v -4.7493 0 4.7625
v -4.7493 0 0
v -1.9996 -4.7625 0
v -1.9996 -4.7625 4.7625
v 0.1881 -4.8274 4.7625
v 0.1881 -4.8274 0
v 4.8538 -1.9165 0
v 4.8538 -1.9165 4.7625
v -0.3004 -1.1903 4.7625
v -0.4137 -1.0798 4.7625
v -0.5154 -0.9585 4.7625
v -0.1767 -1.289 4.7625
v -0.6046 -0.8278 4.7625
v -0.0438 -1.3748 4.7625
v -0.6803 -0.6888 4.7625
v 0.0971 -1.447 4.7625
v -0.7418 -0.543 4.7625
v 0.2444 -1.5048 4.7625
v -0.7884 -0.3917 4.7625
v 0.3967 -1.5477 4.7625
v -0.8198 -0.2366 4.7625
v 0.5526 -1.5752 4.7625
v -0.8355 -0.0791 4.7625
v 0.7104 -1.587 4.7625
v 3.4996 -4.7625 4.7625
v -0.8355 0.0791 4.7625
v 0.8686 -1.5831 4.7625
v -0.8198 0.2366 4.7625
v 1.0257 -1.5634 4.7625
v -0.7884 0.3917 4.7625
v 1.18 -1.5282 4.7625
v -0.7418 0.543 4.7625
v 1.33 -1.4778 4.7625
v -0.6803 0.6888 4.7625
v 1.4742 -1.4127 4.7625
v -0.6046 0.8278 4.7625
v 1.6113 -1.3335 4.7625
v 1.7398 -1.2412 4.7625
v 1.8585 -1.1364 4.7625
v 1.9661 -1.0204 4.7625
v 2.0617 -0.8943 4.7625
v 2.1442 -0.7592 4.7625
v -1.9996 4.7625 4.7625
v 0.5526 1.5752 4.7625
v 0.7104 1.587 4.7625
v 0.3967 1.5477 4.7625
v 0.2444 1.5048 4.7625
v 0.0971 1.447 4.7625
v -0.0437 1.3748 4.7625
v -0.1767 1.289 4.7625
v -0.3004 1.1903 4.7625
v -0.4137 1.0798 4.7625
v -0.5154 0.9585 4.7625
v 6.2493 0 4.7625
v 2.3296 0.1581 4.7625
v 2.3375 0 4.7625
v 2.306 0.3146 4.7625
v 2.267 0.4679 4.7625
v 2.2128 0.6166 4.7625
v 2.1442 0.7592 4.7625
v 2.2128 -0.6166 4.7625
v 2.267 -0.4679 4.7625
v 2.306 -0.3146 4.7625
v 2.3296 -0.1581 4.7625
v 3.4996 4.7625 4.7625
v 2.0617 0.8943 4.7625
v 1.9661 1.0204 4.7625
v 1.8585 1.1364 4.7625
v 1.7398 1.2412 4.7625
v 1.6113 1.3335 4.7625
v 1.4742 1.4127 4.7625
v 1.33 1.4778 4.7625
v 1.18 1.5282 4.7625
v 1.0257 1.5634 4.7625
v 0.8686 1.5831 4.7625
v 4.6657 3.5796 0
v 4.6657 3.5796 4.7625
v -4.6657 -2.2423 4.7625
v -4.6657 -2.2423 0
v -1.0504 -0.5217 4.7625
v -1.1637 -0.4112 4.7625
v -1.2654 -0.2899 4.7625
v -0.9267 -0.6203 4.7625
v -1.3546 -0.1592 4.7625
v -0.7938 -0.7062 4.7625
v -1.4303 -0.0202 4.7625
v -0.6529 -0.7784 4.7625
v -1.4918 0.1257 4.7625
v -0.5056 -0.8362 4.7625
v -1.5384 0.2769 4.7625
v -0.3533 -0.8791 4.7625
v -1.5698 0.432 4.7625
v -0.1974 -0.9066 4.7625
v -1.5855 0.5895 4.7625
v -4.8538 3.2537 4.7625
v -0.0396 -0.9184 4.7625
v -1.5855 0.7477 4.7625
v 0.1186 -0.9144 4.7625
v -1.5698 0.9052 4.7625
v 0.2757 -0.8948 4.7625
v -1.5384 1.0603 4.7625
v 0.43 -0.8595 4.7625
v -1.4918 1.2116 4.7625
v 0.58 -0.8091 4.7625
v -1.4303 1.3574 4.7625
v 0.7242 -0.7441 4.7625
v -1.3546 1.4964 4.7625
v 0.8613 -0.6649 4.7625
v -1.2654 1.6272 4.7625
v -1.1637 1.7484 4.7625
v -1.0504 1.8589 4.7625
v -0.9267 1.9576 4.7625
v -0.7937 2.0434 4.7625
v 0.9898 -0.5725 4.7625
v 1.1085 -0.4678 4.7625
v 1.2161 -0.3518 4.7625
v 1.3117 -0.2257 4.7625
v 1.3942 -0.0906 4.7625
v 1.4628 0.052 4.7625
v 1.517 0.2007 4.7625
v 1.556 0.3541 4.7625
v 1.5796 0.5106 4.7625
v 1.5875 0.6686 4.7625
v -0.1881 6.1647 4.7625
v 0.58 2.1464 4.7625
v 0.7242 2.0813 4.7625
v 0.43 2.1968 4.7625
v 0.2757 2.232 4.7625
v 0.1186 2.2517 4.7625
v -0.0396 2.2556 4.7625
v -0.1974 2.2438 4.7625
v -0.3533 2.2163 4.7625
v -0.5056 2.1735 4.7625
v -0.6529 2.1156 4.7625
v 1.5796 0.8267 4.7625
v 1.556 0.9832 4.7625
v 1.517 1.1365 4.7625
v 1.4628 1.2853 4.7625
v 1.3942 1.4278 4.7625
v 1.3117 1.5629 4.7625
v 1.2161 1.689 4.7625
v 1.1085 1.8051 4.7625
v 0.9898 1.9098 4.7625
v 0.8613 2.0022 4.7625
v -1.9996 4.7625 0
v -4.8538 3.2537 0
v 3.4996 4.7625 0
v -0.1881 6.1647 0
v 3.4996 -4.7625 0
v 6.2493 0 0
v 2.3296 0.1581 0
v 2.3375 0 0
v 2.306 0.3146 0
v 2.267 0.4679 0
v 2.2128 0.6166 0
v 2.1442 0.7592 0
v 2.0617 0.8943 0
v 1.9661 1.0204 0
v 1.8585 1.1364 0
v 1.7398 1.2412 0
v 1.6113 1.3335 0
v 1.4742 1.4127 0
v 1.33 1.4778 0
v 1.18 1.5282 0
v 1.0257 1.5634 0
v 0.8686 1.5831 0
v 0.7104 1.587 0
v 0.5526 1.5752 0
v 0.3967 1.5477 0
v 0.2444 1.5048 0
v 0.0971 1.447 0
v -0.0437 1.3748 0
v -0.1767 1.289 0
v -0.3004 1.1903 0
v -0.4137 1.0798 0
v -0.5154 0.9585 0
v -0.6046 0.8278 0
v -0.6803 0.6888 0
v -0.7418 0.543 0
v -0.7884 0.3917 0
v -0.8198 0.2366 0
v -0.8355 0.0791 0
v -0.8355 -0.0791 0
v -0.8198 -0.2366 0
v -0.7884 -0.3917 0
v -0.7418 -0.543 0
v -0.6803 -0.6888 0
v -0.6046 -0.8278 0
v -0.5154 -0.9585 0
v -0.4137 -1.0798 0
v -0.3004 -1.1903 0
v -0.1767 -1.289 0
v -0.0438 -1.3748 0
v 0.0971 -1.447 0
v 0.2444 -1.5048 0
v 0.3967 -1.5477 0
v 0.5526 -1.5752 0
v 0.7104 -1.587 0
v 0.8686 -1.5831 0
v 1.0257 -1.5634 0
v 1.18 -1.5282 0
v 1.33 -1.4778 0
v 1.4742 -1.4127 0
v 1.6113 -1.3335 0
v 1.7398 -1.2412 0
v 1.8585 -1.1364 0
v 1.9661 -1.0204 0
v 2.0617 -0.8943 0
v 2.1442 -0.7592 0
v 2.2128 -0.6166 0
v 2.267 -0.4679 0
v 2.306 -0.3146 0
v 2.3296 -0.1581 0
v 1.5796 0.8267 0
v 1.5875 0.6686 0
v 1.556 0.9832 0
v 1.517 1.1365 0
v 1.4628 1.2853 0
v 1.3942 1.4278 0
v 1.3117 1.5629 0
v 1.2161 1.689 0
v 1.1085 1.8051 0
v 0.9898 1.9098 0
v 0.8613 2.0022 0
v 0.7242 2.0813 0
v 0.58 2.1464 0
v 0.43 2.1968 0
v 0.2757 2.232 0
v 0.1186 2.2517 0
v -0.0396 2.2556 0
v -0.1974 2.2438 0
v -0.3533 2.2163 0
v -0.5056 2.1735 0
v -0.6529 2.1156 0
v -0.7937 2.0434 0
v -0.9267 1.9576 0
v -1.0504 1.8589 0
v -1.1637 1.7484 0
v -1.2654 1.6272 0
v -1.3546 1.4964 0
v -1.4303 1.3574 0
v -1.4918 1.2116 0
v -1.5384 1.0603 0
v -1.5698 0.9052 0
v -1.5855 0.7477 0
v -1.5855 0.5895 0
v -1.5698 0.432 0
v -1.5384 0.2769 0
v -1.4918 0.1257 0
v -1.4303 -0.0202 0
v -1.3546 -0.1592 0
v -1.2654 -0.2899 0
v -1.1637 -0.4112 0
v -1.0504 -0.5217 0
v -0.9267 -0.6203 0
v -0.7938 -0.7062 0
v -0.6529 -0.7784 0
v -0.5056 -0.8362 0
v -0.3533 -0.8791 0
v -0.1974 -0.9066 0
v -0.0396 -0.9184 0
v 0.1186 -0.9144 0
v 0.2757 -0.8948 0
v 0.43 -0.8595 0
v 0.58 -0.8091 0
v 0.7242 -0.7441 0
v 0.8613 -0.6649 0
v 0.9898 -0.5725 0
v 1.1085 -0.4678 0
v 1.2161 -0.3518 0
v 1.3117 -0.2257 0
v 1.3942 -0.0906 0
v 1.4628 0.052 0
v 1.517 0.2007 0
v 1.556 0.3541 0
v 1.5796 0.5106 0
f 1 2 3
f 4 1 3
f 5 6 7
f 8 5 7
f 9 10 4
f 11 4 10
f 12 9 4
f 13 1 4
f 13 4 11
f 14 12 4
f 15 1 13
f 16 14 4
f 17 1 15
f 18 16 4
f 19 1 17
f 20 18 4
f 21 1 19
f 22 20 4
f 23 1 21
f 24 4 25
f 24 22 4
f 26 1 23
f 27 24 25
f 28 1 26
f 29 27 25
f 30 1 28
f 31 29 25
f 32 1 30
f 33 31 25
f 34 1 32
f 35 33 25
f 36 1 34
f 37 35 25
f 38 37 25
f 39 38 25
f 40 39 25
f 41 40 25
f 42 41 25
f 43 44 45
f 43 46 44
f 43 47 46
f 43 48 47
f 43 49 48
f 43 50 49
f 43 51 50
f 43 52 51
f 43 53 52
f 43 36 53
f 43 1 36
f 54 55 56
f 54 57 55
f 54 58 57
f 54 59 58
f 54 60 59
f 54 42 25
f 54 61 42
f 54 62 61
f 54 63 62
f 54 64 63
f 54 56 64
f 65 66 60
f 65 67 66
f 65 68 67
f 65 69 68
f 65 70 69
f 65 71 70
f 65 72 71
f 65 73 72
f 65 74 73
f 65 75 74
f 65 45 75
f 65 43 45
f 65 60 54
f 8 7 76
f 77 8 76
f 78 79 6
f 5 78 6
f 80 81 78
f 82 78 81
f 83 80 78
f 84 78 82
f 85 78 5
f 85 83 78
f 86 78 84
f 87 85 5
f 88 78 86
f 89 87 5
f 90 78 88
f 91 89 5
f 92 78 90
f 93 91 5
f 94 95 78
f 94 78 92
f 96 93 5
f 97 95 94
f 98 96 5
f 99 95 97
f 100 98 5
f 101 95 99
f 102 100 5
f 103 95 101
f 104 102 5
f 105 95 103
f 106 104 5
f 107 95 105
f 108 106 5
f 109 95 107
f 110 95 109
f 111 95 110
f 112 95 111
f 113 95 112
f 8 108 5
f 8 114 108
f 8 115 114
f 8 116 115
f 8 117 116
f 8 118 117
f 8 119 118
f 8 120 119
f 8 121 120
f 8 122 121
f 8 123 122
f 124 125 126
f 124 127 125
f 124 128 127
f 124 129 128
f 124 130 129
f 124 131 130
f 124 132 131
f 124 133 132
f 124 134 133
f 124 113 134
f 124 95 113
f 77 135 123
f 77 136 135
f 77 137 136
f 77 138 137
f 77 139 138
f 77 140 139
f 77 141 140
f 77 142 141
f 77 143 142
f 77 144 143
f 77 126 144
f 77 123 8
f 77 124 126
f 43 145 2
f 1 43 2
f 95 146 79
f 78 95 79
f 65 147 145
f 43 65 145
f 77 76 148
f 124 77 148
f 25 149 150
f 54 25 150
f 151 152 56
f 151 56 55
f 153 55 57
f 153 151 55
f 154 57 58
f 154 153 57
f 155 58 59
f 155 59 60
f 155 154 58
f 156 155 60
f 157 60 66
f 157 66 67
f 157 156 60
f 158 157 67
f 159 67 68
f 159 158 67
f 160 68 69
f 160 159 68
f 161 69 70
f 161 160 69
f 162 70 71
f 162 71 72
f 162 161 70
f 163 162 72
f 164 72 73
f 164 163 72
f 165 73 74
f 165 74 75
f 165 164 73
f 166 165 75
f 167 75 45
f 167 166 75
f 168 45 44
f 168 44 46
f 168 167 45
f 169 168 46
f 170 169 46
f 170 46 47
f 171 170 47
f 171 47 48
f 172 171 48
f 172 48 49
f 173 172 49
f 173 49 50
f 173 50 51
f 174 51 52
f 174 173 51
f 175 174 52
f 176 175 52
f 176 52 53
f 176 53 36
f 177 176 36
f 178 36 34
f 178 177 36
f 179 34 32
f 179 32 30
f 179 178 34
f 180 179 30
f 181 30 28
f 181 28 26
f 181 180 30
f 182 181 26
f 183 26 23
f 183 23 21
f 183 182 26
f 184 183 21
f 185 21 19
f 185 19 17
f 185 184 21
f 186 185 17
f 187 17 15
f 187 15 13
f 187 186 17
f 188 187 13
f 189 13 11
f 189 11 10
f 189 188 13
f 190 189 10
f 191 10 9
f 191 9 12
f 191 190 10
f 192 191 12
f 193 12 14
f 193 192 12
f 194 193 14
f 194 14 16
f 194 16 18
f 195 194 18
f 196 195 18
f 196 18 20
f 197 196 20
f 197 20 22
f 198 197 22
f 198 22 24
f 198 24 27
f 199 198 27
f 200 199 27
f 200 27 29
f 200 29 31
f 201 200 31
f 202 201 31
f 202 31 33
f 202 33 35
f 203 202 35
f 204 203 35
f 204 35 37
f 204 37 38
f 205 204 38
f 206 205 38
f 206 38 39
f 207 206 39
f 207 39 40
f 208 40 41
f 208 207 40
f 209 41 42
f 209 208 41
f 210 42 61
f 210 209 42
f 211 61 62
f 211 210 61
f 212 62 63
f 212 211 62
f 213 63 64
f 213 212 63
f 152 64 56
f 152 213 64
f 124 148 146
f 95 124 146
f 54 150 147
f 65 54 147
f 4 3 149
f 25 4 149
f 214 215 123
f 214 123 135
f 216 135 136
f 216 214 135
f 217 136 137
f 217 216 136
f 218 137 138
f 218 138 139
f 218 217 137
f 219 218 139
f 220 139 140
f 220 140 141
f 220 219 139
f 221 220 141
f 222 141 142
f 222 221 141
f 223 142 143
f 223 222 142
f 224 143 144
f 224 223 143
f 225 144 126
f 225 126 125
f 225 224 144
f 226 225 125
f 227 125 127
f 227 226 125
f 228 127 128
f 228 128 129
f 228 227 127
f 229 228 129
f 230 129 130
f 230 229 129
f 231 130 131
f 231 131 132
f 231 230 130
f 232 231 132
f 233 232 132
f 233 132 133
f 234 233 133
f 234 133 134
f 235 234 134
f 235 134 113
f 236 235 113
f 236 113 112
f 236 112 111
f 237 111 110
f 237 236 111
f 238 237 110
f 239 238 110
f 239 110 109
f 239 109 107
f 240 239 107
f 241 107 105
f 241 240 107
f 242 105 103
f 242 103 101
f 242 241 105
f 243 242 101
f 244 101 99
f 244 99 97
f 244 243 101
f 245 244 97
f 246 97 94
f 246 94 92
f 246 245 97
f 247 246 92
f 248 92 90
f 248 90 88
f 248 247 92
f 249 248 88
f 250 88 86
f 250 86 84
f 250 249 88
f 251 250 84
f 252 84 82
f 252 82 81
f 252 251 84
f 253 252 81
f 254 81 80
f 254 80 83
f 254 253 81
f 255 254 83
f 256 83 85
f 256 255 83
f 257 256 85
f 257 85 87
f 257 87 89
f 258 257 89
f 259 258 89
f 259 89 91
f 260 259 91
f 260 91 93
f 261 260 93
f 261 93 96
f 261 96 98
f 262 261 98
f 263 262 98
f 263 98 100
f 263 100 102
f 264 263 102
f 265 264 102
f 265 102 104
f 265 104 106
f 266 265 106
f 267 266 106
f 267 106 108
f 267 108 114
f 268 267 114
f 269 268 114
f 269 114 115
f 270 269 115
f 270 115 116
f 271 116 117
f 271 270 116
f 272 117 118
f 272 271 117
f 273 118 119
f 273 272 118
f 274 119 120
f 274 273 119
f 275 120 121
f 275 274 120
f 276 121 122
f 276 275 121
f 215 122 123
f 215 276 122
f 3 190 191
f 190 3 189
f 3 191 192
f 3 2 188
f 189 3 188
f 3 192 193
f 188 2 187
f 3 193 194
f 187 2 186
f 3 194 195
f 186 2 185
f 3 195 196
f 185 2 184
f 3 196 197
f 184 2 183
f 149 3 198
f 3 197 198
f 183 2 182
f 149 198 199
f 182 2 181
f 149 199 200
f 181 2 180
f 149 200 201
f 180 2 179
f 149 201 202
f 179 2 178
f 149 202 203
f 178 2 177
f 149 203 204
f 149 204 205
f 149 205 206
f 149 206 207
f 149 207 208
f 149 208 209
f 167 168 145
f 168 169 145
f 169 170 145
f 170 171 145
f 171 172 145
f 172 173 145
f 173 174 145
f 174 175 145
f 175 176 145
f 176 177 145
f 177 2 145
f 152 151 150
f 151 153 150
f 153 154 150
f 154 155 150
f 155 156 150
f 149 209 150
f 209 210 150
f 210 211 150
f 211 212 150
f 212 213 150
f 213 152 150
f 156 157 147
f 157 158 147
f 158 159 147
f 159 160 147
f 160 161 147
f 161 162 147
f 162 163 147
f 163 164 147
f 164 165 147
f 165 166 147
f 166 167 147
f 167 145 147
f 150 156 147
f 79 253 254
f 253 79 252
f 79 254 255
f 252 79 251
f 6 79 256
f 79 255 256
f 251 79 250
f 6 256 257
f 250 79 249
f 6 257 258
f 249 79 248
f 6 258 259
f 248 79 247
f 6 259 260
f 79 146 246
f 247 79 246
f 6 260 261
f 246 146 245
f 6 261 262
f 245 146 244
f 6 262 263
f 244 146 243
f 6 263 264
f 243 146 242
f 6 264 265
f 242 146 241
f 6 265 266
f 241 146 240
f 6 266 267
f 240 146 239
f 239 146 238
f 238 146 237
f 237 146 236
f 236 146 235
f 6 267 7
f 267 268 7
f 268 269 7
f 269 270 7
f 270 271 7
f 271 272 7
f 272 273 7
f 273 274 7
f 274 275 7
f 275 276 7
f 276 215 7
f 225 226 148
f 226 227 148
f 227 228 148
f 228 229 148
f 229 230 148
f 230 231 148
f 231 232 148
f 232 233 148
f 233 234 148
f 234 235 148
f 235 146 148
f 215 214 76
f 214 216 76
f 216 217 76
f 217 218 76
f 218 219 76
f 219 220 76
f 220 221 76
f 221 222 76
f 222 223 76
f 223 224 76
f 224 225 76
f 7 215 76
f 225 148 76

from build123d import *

# Parameters (mm, degrees)
F0_R     = 1.5875
F1_DEPTH = 4.7625
F2_R     = 1.5875
F3_DEPTH = 4.7625


with BuildPart() as f1:
    # F0 (on Top) → F1 (new body)
    with BuildSketch(Plane.XY):
        Polygon((-0.188116, 6.164661), (-4.853771, 3.253726), (-4.665655, -2.242316), (0.188116, -4.827425), (4.853771, -1.91649), (4.665655, 3.579553), align=None)
        with Locations((0, 0.668618)):
            Circle(F0_R, mode=Mode.SUBTRACT)
    extrude(amount=F1_DEPTH)


with BuildPart() as f3:
    # F2 (on Top) → F3 (new body)
    with BuildSketch(Plane.XY):
        Polygon((-1.999631, -4.7625), (3.499631, -4.7625), (6.249261, 0), (3.499631, 4.7625), (-1.999631, 4.7625), (-4.749261, 0), align=None)
        with Locations((0.75, 0)):
            Circle(F2_R, mode=Mode.SUBTRACT)
    extrude(amount=F3_DEPTH)


solid = Compound([f1.part, f3.part])
